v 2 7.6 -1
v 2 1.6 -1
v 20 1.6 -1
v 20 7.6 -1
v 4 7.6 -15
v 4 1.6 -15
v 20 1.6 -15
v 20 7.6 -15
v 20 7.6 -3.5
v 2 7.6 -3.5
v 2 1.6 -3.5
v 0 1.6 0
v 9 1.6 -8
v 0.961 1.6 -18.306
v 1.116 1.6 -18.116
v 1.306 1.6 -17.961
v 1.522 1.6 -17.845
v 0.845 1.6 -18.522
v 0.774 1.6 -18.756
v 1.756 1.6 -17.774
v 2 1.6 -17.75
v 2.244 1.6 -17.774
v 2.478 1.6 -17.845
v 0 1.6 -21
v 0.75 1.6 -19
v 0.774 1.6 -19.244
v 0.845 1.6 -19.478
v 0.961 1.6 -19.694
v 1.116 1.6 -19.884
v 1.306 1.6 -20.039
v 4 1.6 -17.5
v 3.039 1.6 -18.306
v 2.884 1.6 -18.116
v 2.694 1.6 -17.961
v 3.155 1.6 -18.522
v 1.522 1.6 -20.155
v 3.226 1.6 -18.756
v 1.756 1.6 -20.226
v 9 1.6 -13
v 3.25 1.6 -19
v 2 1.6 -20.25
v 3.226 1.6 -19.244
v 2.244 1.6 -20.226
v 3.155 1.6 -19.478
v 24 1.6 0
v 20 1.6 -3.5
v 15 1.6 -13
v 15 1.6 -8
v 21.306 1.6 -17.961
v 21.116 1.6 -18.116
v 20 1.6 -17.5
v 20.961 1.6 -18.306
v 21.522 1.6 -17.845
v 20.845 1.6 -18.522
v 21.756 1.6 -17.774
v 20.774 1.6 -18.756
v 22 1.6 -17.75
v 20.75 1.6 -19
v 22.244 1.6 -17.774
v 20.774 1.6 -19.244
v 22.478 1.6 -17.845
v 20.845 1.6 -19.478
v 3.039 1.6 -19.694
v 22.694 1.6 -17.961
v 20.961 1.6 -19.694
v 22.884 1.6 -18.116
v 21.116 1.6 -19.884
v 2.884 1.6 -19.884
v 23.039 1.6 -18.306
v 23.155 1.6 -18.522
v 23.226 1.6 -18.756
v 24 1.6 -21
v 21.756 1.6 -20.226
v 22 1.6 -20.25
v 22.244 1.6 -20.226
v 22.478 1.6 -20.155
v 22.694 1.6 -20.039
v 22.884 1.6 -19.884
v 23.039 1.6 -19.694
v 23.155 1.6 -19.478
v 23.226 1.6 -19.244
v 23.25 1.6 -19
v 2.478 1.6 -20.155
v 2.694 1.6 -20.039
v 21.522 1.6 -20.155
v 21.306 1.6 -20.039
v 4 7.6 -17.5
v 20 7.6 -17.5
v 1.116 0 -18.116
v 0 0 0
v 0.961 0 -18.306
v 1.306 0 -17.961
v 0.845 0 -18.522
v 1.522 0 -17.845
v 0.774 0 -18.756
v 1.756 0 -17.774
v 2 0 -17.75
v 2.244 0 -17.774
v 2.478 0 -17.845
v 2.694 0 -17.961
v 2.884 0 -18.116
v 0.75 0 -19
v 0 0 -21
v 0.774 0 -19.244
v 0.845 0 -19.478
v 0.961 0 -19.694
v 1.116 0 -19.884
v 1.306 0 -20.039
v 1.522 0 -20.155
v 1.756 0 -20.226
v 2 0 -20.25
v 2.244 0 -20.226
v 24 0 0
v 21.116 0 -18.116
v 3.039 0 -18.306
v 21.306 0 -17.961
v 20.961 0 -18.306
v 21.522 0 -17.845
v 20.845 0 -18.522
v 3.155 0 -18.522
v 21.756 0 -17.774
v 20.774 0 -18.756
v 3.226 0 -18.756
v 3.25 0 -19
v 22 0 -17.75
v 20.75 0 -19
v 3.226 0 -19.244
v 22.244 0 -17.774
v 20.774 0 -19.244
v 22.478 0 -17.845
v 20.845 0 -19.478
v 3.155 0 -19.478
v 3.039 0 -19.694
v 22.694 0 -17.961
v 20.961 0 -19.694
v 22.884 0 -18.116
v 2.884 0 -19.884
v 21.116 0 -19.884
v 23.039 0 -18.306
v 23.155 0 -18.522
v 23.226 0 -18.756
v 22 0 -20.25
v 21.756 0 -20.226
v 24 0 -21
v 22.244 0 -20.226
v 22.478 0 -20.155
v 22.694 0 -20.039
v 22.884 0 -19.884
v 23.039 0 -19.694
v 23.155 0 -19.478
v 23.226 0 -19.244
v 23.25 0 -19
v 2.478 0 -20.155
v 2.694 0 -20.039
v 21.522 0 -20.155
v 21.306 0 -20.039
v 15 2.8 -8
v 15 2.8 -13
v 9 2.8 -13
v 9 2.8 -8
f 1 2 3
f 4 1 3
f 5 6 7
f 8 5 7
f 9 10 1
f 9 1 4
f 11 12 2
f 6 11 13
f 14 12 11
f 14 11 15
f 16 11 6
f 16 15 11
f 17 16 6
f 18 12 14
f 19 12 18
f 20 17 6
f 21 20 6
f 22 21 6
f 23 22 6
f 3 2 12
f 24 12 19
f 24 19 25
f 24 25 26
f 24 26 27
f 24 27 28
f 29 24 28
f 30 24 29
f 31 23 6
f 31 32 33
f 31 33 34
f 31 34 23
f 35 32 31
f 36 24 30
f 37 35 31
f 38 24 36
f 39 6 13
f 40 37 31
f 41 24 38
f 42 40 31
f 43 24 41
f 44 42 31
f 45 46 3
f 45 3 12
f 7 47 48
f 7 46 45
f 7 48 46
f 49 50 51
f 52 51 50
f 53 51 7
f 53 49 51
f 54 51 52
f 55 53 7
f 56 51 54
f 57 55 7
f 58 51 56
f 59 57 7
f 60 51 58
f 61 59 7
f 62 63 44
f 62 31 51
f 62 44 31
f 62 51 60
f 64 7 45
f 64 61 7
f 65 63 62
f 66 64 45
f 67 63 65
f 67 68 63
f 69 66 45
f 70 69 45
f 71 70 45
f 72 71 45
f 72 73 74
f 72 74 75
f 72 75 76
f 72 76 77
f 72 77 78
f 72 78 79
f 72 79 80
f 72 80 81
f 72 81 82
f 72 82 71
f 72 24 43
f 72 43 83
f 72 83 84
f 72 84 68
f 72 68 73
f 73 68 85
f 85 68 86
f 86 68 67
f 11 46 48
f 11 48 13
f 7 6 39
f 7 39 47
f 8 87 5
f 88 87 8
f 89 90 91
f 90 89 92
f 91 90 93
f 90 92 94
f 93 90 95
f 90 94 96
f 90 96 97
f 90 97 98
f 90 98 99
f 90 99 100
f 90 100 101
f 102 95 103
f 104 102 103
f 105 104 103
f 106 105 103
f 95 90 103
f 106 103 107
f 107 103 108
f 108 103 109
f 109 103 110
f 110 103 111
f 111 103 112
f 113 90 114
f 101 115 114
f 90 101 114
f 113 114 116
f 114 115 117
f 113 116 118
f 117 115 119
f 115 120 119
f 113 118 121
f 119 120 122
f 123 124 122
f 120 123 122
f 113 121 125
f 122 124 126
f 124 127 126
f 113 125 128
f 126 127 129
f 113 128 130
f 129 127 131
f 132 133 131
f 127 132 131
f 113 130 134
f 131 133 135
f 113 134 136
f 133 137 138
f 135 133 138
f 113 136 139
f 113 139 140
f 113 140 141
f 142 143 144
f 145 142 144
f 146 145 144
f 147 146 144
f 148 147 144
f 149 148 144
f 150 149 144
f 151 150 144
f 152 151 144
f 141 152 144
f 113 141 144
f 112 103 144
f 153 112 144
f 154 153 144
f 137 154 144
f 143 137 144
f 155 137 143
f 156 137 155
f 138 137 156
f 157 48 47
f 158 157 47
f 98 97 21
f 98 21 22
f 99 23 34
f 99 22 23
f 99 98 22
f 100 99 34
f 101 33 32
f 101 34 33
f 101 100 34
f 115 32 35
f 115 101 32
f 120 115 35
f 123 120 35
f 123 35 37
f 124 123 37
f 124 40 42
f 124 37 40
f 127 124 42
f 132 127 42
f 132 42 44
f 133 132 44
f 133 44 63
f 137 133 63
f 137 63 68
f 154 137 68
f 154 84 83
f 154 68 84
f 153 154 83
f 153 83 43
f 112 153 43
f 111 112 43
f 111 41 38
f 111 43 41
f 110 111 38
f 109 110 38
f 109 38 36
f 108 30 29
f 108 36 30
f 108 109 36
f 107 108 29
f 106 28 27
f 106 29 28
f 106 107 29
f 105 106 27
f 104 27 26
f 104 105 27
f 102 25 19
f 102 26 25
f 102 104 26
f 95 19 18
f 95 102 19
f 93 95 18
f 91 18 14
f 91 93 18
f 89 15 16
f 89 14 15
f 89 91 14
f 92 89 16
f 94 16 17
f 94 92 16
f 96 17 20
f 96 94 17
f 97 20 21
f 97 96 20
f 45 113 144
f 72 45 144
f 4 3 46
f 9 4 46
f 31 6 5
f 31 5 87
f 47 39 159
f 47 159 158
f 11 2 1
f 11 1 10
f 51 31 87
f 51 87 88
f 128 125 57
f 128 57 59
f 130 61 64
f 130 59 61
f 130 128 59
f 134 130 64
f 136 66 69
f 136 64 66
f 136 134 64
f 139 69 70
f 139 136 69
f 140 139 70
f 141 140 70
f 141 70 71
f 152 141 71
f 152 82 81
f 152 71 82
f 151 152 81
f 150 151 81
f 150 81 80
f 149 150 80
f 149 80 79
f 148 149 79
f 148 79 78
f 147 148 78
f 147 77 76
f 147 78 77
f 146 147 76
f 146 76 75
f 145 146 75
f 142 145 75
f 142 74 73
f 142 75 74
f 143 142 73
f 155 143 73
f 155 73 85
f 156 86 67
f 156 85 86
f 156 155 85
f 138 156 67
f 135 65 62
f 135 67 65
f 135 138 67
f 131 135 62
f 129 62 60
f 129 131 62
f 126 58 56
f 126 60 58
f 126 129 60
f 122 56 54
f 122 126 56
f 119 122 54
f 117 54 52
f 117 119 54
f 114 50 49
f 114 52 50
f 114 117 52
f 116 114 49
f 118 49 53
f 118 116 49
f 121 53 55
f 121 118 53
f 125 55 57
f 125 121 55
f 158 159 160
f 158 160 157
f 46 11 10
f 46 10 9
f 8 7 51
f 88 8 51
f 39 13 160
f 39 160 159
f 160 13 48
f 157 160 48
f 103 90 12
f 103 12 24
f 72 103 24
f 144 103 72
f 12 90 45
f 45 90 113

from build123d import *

# Parameters (mm, degrees)
SKETCH1_W               = 24
SKETCH1_H               = 21
PCB_DEPTH               = 1.6
MOUNT_HOLE_1_DEPTH      = 32.930549635
MOUNT_HOLE_1_DEPTH_BACK = 32.930549635
SKETCH2_R               = 1.25
MOUNT_HOLE_2_DEPTH      = 32.930549635
MOUNT_HOLE_2_DEPTH_BACK = 32.930549635
SKETCH3_R               = 1.25
MX1508_IC_START         = 1.6
SKETCH4_W               = 6
SKETCH4_H               = 5
MX1508_IC_DEPTH         = 1.2
PINS_IN_START           = 1.6
SKETCH5_W               = 18
SKETCH5_H               = 2.5
PINS_IN_DEPTH           = 6
PINS_OUT_START          = 1.6
SKETCH6_W               = 16
SKETCH6_H               = 2.5
PINS_OUT_DEPTH          = 6


with BuildPart() as part:
    # Sketch1 → PCB (new body)
    with BuildSketch(Plane(origin=(0, 0, 0), x_dir=(1, 0, 0), z_dir=(0, 1, 0))):
        with Locations((12, 10.5)):
            Rectangle(SKETCH1_W, SKETCH1_H)
    extrude(amount=PCB_DEPTH)

    # Sketch2 → Mount_hole_1 (cut, two sides: drawn at the far end of the back side and taken through both)
    with BuildSketch(Plane(origin=(0, 0, 0), x_dir=(1, 0, 0), z_dir=(0, 1, 0)).offset(-MOUNT_HOLE_1_DEPTH_BACK)):
        with Locations(Location((2, 19, 0), (0, 0, 270))):
            Circle(SKETCH2_R)
    extrude(amount=MOUNT_HOLE_1_DEPTH + MOUNT_HOLE_1_DEPTH_BACK, mode=Mode.SUBTRACT)

    # Sketch3 → Mount_hole_2 (cut, two sides: drawn at the far end of the back side and taken through both)
    with BuildSketch(Plane(origin=(0, 0, 0), x_dir=(1, 0, 0), z_dir=(0, 1, 0)).offset(-MOUNT_HOLE_2_DEPTH_BACK)):
        with Locations(Location((22, 19, 0), (0, 0, 270))):
            Circle(SKETCH3_R)
    extrude(amount=MOUNT_HOLE_2_DEPTH + MOUNT_HOLE_2_DEPTH_BACK, mode=Mode.SUBTRACT)

    # Sketch4 → MX1508_IC (add)
    with BuildSketch(Plane(origin=(0, 0, 0), x_dir=(1, 0, 0), z_dir=(0, 1, 0)).offset(MX1508_IC_START)):
        with Locations((12, 10.5)):
            Rectangle(SKETCH4_W, SKETCH4_H)
    extrude(amount=MX1508_IC_DEPTH)

    # Sketch5 → Pins_in (add)
    with BuildSketch(Plane(origin=(0, 0, 0), x_dir=(1, 0, 0), z_dir=(0, 1, 0)).offset(PINS_IN_START)):
        with Locations((11, 2.25)):
            Rectangle(SKETCH5_W, SKETCH5_H)
    extrude(amount=PINS_IN_DEPTH)

    # Sketch6 → Pins_out (add)
    with BuildSketch(Plane(origin=(0, 0, 0), x_dir=(1, 0, 0), z_dir=(0, 1, 0)).offset(PINS_OUT_START)):
        with Locations((12, 16.25)):
            Rectangle(SKETCH6_W, SKETCH6_H)
    extrude(amount=PINS_OUT_DEPTH)


solid = part.part
